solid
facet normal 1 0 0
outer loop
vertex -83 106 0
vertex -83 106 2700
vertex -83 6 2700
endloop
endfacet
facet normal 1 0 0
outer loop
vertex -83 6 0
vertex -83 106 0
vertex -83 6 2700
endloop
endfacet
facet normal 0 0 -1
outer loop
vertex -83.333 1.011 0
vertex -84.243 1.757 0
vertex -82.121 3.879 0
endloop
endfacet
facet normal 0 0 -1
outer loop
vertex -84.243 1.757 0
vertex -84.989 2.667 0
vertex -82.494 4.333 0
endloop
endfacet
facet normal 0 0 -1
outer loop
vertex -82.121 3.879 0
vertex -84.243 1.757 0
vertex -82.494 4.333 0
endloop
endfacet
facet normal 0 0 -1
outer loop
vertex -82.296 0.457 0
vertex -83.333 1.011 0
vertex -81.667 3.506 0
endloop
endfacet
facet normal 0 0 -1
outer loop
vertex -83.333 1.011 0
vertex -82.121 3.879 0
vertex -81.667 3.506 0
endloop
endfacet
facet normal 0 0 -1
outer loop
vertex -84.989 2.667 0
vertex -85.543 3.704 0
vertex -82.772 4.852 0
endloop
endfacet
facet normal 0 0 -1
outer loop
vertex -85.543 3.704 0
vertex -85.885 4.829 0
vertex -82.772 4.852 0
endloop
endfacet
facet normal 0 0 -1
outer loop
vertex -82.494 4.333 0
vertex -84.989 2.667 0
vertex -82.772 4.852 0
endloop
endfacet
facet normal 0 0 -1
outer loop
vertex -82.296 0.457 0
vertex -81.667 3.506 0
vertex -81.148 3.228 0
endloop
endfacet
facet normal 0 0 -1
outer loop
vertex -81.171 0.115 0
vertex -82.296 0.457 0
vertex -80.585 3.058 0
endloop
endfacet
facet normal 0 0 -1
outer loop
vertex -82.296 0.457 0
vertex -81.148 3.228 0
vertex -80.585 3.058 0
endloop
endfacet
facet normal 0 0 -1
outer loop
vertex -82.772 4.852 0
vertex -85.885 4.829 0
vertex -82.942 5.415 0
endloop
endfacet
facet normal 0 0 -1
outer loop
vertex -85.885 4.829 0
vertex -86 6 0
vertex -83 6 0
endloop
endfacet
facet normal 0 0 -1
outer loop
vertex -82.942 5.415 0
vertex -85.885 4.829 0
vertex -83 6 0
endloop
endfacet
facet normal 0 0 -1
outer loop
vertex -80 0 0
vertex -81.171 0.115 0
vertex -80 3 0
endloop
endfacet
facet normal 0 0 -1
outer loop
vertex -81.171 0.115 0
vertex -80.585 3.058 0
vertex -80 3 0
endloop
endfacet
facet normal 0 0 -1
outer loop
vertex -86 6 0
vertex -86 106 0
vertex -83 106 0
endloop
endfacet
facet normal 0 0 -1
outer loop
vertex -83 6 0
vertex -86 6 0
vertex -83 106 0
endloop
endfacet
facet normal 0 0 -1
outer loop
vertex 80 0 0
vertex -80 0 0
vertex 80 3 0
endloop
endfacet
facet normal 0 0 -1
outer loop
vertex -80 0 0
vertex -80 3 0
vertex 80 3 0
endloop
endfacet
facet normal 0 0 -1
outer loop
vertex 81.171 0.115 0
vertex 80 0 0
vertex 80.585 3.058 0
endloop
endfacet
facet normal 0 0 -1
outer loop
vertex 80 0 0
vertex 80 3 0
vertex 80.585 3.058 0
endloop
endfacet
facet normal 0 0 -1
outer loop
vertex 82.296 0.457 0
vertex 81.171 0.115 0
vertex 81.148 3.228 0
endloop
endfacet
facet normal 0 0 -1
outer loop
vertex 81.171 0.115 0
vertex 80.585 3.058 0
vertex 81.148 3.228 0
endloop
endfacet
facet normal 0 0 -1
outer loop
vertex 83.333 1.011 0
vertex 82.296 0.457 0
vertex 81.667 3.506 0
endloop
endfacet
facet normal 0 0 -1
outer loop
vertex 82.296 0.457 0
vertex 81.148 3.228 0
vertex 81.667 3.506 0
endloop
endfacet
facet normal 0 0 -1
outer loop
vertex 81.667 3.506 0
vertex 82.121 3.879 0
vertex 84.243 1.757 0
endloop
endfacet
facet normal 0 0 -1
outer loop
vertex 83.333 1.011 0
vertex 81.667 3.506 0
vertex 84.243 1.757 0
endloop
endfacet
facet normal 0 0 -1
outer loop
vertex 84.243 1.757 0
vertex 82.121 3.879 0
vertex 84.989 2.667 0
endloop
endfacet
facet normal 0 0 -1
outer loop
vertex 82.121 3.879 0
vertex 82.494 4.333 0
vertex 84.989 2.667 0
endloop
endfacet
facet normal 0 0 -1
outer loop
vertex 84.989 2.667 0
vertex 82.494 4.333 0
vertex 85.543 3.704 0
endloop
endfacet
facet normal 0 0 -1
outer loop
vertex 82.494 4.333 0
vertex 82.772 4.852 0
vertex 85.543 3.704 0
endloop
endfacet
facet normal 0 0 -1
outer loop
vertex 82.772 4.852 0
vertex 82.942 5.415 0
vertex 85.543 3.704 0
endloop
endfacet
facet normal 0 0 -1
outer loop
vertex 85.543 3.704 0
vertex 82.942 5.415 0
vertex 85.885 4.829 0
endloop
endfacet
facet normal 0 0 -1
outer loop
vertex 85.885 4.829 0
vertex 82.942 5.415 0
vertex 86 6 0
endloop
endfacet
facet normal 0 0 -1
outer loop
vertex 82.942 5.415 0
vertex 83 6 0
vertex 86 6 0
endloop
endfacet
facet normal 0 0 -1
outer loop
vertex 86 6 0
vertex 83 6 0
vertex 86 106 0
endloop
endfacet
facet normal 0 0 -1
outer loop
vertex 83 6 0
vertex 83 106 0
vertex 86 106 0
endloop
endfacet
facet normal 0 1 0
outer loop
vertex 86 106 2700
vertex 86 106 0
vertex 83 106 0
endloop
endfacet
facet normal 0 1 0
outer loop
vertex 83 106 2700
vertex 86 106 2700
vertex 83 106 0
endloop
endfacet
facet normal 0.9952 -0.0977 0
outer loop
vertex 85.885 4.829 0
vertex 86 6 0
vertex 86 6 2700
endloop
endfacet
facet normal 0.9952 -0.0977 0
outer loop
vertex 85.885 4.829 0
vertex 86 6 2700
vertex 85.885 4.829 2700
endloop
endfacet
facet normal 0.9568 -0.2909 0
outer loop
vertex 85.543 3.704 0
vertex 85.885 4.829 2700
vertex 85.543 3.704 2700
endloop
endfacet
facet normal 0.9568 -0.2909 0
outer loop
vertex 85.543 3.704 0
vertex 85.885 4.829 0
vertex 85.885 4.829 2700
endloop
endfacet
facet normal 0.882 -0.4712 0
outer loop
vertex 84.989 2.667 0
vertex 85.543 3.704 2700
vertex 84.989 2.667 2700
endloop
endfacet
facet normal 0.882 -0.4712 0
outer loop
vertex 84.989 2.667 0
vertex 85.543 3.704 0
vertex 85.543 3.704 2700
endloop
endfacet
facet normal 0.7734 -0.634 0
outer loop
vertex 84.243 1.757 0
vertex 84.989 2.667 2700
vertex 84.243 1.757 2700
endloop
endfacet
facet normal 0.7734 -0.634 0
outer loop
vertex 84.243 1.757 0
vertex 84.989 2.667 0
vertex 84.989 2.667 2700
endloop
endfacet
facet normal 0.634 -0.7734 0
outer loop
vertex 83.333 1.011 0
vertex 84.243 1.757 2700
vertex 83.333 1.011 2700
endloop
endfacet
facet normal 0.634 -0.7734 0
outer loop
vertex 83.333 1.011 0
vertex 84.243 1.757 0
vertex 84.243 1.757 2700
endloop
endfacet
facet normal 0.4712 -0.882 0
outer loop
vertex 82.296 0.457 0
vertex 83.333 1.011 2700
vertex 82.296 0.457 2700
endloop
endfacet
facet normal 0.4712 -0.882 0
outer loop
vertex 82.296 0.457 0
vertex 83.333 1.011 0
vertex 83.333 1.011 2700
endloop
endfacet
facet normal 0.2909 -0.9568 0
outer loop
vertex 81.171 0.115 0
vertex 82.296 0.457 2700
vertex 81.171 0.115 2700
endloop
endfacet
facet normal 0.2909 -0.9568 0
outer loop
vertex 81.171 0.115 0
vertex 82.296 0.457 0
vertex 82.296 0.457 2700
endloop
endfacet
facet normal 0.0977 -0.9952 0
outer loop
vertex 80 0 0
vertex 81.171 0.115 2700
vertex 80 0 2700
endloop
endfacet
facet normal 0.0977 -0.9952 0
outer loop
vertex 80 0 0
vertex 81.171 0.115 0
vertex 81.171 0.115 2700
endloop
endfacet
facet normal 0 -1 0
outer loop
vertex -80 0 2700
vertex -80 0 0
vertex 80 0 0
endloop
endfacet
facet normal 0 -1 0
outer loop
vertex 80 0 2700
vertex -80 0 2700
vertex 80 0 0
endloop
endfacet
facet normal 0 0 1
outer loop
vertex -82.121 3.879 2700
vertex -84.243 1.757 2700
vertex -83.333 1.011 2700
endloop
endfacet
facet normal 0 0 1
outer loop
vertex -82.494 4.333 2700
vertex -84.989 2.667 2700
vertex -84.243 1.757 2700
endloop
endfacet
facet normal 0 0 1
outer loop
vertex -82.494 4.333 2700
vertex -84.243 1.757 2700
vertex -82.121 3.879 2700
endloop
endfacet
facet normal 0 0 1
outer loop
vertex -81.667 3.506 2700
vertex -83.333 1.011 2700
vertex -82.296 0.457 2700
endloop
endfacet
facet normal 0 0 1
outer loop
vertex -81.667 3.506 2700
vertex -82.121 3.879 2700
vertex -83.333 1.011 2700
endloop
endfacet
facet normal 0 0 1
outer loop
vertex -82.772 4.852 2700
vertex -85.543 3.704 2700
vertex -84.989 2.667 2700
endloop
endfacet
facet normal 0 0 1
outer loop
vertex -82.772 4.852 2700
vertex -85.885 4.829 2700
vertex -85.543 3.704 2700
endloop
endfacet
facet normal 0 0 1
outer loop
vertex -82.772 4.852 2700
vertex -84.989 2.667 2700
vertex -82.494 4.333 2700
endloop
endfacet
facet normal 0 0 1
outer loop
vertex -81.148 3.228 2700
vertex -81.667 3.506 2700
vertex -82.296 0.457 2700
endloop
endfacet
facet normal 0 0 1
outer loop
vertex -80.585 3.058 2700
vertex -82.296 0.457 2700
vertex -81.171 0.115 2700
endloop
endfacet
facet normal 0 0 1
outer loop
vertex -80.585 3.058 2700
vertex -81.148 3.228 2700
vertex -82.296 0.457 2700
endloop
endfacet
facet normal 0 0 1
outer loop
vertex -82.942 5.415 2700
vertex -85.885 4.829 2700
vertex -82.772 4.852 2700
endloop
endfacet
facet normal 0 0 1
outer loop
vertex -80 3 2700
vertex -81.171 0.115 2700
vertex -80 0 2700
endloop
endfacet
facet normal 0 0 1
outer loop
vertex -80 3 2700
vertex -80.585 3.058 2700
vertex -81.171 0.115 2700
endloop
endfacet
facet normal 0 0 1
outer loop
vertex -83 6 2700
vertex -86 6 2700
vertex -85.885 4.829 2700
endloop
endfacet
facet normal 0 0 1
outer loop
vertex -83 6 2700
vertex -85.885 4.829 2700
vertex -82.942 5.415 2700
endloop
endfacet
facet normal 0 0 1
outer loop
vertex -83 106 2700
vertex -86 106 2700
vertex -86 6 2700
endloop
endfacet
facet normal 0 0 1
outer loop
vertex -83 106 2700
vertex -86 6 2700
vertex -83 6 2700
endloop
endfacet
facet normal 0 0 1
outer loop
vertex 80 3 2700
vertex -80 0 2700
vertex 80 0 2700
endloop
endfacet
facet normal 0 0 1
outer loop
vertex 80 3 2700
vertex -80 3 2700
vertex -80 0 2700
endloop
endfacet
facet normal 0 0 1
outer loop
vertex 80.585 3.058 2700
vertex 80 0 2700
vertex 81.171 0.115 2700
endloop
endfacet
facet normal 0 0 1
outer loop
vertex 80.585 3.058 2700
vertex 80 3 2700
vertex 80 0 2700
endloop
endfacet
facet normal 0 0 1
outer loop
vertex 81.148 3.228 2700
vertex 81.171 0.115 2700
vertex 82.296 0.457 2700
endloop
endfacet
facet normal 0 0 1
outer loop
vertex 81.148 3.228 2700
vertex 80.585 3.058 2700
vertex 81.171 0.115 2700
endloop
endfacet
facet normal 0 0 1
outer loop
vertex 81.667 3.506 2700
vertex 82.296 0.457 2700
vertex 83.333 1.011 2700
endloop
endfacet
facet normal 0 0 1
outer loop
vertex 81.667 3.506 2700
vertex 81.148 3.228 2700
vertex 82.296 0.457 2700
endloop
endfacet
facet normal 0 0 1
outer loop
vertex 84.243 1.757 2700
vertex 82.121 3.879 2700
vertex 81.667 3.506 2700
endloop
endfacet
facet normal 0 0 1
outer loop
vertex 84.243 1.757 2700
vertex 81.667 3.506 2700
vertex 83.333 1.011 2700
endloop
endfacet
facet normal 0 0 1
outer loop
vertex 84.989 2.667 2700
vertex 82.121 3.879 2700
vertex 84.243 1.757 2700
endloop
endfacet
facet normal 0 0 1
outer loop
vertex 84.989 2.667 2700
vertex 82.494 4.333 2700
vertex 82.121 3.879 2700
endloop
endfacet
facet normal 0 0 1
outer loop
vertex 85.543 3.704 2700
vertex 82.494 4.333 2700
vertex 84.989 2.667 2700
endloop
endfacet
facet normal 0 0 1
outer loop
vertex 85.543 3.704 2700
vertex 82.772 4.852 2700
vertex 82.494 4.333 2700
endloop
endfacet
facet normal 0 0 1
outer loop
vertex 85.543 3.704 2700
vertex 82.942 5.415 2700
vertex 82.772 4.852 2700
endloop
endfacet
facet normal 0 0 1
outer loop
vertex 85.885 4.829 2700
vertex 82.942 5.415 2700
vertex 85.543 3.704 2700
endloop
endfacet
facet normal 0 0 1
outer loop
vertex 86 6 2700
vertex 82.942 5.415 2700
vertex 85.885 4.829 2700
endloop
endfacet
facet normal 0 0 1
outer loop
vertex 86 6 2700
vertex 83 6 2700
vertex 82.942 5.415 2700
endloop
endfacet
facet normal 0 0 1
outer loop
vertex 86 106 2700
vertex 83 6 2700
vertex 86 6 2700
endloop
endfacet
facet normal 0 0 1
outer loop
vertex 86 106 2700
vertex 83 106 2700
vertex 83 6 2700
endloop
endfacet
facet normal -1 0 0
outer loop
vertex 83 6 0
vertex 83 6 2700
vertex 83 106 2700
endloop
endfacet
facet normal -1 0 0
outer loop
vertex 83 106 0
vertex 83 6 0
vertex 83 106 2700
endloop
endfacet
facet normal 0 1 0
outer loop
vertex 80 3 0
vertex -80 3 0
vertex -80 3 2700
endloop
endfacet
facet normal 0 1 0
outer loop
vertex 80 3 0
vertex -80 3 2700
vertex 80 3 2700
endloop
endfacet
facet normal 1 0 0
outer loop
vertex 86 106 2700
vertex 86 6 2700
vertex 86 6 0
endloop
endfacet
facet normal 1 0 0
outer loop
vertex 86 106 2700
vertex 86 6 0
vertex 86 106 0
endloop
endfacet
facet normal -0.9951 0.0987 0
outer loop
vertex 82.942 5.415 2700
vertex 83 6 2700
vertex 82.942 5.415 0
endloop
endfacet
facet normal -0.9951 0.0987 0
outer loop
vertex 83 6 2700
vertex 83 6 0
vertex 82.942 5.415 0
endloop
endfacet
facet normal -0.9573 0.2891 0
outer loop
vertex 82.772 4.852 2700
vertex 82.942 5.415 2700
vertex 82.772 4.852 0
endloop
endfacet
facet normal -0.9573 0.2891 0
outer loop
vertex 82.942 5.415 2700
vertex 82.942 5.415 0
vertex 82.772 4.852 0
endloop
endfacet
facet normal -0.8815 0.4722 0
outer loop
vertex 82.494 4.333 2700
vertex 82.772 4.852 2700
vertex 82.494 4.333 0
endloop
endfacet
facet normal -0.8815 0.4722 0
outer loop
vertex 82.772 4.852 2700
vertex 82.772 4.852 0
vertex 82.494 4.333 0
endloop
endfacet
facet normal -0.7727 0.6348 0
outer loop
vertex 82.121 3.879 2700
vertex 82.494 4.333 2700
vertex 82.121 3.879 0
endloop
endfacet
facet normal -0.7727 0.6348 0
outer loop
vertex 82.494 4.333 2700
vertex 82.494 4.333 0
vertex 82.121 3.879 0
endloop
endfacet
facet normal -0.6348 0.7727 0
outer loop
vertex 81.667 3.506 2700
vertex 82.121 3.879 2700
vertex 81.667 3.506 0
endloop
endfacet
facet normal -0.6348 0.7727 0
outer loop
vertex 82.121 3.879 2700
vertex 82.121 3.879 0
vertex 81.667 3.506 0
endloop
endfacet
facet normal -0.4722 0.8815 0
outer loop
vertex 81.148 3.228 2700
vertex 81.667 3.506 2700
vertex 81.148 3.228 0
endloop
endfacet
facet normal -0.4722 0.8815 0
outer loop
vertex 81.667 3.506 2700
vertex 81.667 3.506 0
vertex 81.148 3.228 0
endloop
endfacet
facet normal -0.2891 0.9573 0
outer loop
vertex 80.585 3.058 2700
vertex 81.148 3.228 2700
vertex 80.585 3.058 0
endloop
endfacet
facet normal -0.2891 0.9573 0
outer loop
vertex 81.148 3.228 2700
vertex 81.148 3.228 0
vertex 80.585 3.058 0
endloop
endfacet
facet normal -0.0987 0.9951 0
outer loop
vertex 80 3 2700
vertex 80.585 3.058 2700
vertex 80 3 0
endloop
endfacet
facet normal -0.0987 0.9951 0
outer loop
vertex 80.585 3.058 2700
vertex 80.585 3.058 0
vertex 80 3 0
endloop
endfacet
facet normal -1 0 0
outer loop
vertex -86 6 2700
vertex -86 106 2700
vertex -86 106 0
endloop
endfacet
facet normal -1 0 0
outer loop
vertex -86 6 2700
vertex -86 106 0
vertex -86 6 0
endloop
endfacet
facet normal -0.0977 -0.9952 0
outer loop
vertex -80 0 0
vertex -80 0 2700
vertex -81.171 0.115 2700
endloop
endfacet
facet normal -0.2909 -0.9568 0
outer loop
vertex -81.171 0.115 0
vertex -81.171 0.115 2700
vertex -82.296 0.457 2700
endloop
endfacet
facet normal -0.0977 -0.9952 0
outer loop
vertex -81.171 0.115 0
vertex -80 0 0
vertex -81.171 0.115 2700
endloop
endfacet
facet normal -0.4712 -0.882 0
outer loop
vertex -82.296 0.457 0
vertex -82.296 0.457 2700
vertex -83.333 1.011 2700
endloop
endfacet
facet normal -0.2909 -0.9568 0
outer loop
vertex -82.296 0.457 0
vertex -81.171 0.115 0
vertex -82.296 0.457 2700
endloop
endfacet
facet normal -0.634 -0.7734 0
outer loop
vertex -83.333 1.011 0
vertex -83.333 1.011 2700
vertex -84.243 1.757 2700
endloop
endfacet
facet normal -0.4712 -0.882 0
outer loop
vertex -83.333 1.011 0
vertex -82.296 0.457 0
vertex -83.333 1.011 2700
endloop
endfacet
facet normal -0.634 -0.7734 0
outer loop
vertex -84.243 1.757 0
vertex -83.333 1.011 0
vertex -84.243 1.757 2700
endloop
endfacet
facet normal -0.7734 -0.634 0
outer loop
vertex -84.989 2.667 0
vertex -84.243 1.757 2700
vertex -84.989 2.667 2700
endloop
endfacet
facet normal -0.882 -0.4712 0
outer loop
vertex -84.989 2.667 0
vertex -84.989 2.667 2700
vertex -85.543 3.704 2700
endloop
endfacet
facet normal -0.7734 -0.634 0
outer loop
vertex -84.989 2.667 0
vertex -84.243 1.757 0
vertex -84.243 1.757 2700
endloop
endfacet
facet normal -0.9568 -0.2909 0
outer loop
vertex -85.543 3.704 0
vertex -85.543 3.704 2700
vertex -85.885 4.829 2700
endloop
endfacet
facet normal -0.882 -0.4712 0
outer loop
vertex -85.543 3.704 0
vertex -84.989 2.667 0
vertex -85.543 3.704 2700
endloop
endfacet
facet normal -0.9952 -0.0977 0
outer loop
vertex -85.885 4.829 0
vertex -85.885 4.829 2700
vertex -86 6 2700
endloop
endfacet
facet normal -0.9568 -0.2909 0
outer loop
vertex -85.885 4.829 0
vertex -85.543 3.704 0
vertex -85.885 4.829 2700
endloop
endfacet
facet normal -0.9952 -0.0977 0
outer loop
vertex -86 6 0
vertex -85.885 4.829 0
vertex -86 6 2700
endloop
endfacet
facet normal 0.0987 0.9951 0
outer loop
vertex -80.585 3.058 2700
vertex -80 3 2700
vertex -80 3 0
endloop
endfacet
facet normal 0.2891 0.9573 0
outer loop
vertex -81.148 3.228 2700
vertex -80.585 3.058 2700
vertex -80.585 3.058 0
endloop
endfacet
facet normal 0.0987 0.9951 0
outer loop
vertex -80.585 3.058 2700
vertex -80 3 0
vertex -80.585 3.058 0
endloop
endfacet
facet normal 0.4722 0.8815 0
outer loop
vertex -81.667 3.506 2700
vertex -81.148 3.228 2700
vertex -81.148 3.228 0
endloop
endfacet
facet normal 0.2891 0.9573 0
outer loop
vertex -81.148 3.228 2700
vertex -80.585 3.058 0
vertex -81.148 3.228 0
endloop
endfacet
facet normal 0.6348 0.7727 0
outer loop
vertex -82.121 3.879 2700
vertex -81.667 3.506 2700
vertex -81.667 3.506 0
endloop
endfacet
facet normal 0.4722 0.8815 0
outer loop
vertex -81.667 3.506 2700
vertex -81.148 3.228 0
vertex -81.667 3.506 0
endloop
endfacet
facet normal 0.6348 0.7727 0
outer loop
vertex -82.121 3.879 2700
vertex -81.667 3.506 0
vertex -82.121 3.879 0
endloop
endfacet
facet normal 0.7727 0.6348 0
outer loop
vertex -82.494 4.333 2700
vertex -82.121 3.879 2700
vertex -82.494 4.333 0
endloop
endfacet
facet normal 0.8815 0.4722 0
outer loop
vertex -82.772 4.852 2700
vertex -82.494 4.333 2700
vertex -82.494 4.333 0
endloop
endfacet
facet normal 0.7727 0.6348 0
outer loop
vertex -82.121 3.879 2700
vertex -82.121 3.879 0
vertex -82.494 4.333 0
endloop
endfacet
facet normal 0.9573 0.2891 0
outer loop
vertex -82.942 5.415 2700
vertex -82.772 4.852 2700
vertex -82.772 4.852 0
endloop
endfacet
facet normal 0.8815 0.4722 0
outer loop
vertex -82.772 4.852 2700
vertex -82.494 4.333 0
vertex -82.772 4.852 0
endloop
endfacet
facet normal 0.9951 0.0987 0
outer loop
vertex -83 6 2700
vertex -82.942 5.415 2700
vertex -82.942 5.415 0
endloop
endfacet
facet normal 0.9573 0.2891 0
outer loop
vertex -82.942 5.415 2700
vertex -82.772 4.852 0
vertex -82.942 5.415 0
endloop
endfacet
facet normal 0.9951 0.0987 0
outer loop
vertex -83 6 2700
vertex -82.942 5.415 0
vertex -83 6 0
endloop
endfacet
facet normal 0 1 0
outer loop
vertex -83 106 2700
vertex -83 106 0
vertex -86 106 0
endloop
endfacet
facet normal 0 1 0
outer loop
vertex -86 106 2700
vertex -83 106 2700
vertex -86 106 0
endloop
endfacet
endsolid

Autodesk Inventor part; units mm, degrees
ref_plane "YZ Plane" through (0, 0, 0) normal (1, 0, 0) x (0, 1, 0)
ref_plane "XZ Plane" through (0, 0, 0) normal (0, 1, 0) x (-1, 0, 0)
ref_plane "XY Plane" through (0, 0, 0) normal (0, 0, 1) x (1, 0, 0)
sketch "Sketch1" plane through (0, 0, 0) normal (0, 0, 1) x (1, 0, 0)
  line L0 (86, 6) -> (86, 106)
  line L1 (2021.3603, 237.2065) -> (2021.3603, 237.2065) construction
  arc A0 (80, 0) -> (86, 6) centre (80, 6) ccw
  line L2 (0, 0) -> (80, 0)
  dimension "d25" = 6
  dimension "d46" = 90
  dimension "d47" = 80
  dimension "d48" = 100
contour flange "Contour Flange1" sketch "Sketch1" thickness 3 bend radius 3 width 2700 along (0, 0, 1) mid plane no both sides no wall seen from (40, 0, 0) lies toward (0, 1, 0) curves L2 A0 L0
bend "Bend1"
corner "Corner1"
mirror "Mirror1" about plane through (0, 0, 0) normal (1, 0, 0)
equation "\"d25\" = Thickness + BendRadius"
equation "\"d7\" = Thickness"
equation "\"d8\" = BendReliefWidth"
equation "\"d9\" = BendReliefDepth"
equation "\"d10\" = MinimumRemnant"
equation "\"d11\" = TransitionRadius"
equation "\"d13\" = BendRadius"
equation "\"d15\" = CornerReliefSize"
equation "\"d16\" = GapSize"
equation "\"d17\" = JacobiRadiusSize"
equation "\"BendRadius\" = Thickness"
equation "\"BendReliefWidth\" = Thickness"
equation "\"BendReliefDepth\" = 0.5 * Thickness"
equation "\"CornerReliefSize\" = 4 * Thickness"
equation "\"MinimumRemnant\" = 2 * Thickness"
equation "\"TransitionRadius\" = BendRadius"
equation "\"JacobiRadiusSize\" = BendRadius"
equation "\"GapSize\" = Thickness"
equation "\"d38\" = d40 + d44"
equation "\"d39\" = d40"
equation "\"d44\" = d40"
equation "\"Thickness\" = 3"
equation "\"d40\" = 3"
properties part number "MSC 077 screen pillar" material "Stainless Steel"
